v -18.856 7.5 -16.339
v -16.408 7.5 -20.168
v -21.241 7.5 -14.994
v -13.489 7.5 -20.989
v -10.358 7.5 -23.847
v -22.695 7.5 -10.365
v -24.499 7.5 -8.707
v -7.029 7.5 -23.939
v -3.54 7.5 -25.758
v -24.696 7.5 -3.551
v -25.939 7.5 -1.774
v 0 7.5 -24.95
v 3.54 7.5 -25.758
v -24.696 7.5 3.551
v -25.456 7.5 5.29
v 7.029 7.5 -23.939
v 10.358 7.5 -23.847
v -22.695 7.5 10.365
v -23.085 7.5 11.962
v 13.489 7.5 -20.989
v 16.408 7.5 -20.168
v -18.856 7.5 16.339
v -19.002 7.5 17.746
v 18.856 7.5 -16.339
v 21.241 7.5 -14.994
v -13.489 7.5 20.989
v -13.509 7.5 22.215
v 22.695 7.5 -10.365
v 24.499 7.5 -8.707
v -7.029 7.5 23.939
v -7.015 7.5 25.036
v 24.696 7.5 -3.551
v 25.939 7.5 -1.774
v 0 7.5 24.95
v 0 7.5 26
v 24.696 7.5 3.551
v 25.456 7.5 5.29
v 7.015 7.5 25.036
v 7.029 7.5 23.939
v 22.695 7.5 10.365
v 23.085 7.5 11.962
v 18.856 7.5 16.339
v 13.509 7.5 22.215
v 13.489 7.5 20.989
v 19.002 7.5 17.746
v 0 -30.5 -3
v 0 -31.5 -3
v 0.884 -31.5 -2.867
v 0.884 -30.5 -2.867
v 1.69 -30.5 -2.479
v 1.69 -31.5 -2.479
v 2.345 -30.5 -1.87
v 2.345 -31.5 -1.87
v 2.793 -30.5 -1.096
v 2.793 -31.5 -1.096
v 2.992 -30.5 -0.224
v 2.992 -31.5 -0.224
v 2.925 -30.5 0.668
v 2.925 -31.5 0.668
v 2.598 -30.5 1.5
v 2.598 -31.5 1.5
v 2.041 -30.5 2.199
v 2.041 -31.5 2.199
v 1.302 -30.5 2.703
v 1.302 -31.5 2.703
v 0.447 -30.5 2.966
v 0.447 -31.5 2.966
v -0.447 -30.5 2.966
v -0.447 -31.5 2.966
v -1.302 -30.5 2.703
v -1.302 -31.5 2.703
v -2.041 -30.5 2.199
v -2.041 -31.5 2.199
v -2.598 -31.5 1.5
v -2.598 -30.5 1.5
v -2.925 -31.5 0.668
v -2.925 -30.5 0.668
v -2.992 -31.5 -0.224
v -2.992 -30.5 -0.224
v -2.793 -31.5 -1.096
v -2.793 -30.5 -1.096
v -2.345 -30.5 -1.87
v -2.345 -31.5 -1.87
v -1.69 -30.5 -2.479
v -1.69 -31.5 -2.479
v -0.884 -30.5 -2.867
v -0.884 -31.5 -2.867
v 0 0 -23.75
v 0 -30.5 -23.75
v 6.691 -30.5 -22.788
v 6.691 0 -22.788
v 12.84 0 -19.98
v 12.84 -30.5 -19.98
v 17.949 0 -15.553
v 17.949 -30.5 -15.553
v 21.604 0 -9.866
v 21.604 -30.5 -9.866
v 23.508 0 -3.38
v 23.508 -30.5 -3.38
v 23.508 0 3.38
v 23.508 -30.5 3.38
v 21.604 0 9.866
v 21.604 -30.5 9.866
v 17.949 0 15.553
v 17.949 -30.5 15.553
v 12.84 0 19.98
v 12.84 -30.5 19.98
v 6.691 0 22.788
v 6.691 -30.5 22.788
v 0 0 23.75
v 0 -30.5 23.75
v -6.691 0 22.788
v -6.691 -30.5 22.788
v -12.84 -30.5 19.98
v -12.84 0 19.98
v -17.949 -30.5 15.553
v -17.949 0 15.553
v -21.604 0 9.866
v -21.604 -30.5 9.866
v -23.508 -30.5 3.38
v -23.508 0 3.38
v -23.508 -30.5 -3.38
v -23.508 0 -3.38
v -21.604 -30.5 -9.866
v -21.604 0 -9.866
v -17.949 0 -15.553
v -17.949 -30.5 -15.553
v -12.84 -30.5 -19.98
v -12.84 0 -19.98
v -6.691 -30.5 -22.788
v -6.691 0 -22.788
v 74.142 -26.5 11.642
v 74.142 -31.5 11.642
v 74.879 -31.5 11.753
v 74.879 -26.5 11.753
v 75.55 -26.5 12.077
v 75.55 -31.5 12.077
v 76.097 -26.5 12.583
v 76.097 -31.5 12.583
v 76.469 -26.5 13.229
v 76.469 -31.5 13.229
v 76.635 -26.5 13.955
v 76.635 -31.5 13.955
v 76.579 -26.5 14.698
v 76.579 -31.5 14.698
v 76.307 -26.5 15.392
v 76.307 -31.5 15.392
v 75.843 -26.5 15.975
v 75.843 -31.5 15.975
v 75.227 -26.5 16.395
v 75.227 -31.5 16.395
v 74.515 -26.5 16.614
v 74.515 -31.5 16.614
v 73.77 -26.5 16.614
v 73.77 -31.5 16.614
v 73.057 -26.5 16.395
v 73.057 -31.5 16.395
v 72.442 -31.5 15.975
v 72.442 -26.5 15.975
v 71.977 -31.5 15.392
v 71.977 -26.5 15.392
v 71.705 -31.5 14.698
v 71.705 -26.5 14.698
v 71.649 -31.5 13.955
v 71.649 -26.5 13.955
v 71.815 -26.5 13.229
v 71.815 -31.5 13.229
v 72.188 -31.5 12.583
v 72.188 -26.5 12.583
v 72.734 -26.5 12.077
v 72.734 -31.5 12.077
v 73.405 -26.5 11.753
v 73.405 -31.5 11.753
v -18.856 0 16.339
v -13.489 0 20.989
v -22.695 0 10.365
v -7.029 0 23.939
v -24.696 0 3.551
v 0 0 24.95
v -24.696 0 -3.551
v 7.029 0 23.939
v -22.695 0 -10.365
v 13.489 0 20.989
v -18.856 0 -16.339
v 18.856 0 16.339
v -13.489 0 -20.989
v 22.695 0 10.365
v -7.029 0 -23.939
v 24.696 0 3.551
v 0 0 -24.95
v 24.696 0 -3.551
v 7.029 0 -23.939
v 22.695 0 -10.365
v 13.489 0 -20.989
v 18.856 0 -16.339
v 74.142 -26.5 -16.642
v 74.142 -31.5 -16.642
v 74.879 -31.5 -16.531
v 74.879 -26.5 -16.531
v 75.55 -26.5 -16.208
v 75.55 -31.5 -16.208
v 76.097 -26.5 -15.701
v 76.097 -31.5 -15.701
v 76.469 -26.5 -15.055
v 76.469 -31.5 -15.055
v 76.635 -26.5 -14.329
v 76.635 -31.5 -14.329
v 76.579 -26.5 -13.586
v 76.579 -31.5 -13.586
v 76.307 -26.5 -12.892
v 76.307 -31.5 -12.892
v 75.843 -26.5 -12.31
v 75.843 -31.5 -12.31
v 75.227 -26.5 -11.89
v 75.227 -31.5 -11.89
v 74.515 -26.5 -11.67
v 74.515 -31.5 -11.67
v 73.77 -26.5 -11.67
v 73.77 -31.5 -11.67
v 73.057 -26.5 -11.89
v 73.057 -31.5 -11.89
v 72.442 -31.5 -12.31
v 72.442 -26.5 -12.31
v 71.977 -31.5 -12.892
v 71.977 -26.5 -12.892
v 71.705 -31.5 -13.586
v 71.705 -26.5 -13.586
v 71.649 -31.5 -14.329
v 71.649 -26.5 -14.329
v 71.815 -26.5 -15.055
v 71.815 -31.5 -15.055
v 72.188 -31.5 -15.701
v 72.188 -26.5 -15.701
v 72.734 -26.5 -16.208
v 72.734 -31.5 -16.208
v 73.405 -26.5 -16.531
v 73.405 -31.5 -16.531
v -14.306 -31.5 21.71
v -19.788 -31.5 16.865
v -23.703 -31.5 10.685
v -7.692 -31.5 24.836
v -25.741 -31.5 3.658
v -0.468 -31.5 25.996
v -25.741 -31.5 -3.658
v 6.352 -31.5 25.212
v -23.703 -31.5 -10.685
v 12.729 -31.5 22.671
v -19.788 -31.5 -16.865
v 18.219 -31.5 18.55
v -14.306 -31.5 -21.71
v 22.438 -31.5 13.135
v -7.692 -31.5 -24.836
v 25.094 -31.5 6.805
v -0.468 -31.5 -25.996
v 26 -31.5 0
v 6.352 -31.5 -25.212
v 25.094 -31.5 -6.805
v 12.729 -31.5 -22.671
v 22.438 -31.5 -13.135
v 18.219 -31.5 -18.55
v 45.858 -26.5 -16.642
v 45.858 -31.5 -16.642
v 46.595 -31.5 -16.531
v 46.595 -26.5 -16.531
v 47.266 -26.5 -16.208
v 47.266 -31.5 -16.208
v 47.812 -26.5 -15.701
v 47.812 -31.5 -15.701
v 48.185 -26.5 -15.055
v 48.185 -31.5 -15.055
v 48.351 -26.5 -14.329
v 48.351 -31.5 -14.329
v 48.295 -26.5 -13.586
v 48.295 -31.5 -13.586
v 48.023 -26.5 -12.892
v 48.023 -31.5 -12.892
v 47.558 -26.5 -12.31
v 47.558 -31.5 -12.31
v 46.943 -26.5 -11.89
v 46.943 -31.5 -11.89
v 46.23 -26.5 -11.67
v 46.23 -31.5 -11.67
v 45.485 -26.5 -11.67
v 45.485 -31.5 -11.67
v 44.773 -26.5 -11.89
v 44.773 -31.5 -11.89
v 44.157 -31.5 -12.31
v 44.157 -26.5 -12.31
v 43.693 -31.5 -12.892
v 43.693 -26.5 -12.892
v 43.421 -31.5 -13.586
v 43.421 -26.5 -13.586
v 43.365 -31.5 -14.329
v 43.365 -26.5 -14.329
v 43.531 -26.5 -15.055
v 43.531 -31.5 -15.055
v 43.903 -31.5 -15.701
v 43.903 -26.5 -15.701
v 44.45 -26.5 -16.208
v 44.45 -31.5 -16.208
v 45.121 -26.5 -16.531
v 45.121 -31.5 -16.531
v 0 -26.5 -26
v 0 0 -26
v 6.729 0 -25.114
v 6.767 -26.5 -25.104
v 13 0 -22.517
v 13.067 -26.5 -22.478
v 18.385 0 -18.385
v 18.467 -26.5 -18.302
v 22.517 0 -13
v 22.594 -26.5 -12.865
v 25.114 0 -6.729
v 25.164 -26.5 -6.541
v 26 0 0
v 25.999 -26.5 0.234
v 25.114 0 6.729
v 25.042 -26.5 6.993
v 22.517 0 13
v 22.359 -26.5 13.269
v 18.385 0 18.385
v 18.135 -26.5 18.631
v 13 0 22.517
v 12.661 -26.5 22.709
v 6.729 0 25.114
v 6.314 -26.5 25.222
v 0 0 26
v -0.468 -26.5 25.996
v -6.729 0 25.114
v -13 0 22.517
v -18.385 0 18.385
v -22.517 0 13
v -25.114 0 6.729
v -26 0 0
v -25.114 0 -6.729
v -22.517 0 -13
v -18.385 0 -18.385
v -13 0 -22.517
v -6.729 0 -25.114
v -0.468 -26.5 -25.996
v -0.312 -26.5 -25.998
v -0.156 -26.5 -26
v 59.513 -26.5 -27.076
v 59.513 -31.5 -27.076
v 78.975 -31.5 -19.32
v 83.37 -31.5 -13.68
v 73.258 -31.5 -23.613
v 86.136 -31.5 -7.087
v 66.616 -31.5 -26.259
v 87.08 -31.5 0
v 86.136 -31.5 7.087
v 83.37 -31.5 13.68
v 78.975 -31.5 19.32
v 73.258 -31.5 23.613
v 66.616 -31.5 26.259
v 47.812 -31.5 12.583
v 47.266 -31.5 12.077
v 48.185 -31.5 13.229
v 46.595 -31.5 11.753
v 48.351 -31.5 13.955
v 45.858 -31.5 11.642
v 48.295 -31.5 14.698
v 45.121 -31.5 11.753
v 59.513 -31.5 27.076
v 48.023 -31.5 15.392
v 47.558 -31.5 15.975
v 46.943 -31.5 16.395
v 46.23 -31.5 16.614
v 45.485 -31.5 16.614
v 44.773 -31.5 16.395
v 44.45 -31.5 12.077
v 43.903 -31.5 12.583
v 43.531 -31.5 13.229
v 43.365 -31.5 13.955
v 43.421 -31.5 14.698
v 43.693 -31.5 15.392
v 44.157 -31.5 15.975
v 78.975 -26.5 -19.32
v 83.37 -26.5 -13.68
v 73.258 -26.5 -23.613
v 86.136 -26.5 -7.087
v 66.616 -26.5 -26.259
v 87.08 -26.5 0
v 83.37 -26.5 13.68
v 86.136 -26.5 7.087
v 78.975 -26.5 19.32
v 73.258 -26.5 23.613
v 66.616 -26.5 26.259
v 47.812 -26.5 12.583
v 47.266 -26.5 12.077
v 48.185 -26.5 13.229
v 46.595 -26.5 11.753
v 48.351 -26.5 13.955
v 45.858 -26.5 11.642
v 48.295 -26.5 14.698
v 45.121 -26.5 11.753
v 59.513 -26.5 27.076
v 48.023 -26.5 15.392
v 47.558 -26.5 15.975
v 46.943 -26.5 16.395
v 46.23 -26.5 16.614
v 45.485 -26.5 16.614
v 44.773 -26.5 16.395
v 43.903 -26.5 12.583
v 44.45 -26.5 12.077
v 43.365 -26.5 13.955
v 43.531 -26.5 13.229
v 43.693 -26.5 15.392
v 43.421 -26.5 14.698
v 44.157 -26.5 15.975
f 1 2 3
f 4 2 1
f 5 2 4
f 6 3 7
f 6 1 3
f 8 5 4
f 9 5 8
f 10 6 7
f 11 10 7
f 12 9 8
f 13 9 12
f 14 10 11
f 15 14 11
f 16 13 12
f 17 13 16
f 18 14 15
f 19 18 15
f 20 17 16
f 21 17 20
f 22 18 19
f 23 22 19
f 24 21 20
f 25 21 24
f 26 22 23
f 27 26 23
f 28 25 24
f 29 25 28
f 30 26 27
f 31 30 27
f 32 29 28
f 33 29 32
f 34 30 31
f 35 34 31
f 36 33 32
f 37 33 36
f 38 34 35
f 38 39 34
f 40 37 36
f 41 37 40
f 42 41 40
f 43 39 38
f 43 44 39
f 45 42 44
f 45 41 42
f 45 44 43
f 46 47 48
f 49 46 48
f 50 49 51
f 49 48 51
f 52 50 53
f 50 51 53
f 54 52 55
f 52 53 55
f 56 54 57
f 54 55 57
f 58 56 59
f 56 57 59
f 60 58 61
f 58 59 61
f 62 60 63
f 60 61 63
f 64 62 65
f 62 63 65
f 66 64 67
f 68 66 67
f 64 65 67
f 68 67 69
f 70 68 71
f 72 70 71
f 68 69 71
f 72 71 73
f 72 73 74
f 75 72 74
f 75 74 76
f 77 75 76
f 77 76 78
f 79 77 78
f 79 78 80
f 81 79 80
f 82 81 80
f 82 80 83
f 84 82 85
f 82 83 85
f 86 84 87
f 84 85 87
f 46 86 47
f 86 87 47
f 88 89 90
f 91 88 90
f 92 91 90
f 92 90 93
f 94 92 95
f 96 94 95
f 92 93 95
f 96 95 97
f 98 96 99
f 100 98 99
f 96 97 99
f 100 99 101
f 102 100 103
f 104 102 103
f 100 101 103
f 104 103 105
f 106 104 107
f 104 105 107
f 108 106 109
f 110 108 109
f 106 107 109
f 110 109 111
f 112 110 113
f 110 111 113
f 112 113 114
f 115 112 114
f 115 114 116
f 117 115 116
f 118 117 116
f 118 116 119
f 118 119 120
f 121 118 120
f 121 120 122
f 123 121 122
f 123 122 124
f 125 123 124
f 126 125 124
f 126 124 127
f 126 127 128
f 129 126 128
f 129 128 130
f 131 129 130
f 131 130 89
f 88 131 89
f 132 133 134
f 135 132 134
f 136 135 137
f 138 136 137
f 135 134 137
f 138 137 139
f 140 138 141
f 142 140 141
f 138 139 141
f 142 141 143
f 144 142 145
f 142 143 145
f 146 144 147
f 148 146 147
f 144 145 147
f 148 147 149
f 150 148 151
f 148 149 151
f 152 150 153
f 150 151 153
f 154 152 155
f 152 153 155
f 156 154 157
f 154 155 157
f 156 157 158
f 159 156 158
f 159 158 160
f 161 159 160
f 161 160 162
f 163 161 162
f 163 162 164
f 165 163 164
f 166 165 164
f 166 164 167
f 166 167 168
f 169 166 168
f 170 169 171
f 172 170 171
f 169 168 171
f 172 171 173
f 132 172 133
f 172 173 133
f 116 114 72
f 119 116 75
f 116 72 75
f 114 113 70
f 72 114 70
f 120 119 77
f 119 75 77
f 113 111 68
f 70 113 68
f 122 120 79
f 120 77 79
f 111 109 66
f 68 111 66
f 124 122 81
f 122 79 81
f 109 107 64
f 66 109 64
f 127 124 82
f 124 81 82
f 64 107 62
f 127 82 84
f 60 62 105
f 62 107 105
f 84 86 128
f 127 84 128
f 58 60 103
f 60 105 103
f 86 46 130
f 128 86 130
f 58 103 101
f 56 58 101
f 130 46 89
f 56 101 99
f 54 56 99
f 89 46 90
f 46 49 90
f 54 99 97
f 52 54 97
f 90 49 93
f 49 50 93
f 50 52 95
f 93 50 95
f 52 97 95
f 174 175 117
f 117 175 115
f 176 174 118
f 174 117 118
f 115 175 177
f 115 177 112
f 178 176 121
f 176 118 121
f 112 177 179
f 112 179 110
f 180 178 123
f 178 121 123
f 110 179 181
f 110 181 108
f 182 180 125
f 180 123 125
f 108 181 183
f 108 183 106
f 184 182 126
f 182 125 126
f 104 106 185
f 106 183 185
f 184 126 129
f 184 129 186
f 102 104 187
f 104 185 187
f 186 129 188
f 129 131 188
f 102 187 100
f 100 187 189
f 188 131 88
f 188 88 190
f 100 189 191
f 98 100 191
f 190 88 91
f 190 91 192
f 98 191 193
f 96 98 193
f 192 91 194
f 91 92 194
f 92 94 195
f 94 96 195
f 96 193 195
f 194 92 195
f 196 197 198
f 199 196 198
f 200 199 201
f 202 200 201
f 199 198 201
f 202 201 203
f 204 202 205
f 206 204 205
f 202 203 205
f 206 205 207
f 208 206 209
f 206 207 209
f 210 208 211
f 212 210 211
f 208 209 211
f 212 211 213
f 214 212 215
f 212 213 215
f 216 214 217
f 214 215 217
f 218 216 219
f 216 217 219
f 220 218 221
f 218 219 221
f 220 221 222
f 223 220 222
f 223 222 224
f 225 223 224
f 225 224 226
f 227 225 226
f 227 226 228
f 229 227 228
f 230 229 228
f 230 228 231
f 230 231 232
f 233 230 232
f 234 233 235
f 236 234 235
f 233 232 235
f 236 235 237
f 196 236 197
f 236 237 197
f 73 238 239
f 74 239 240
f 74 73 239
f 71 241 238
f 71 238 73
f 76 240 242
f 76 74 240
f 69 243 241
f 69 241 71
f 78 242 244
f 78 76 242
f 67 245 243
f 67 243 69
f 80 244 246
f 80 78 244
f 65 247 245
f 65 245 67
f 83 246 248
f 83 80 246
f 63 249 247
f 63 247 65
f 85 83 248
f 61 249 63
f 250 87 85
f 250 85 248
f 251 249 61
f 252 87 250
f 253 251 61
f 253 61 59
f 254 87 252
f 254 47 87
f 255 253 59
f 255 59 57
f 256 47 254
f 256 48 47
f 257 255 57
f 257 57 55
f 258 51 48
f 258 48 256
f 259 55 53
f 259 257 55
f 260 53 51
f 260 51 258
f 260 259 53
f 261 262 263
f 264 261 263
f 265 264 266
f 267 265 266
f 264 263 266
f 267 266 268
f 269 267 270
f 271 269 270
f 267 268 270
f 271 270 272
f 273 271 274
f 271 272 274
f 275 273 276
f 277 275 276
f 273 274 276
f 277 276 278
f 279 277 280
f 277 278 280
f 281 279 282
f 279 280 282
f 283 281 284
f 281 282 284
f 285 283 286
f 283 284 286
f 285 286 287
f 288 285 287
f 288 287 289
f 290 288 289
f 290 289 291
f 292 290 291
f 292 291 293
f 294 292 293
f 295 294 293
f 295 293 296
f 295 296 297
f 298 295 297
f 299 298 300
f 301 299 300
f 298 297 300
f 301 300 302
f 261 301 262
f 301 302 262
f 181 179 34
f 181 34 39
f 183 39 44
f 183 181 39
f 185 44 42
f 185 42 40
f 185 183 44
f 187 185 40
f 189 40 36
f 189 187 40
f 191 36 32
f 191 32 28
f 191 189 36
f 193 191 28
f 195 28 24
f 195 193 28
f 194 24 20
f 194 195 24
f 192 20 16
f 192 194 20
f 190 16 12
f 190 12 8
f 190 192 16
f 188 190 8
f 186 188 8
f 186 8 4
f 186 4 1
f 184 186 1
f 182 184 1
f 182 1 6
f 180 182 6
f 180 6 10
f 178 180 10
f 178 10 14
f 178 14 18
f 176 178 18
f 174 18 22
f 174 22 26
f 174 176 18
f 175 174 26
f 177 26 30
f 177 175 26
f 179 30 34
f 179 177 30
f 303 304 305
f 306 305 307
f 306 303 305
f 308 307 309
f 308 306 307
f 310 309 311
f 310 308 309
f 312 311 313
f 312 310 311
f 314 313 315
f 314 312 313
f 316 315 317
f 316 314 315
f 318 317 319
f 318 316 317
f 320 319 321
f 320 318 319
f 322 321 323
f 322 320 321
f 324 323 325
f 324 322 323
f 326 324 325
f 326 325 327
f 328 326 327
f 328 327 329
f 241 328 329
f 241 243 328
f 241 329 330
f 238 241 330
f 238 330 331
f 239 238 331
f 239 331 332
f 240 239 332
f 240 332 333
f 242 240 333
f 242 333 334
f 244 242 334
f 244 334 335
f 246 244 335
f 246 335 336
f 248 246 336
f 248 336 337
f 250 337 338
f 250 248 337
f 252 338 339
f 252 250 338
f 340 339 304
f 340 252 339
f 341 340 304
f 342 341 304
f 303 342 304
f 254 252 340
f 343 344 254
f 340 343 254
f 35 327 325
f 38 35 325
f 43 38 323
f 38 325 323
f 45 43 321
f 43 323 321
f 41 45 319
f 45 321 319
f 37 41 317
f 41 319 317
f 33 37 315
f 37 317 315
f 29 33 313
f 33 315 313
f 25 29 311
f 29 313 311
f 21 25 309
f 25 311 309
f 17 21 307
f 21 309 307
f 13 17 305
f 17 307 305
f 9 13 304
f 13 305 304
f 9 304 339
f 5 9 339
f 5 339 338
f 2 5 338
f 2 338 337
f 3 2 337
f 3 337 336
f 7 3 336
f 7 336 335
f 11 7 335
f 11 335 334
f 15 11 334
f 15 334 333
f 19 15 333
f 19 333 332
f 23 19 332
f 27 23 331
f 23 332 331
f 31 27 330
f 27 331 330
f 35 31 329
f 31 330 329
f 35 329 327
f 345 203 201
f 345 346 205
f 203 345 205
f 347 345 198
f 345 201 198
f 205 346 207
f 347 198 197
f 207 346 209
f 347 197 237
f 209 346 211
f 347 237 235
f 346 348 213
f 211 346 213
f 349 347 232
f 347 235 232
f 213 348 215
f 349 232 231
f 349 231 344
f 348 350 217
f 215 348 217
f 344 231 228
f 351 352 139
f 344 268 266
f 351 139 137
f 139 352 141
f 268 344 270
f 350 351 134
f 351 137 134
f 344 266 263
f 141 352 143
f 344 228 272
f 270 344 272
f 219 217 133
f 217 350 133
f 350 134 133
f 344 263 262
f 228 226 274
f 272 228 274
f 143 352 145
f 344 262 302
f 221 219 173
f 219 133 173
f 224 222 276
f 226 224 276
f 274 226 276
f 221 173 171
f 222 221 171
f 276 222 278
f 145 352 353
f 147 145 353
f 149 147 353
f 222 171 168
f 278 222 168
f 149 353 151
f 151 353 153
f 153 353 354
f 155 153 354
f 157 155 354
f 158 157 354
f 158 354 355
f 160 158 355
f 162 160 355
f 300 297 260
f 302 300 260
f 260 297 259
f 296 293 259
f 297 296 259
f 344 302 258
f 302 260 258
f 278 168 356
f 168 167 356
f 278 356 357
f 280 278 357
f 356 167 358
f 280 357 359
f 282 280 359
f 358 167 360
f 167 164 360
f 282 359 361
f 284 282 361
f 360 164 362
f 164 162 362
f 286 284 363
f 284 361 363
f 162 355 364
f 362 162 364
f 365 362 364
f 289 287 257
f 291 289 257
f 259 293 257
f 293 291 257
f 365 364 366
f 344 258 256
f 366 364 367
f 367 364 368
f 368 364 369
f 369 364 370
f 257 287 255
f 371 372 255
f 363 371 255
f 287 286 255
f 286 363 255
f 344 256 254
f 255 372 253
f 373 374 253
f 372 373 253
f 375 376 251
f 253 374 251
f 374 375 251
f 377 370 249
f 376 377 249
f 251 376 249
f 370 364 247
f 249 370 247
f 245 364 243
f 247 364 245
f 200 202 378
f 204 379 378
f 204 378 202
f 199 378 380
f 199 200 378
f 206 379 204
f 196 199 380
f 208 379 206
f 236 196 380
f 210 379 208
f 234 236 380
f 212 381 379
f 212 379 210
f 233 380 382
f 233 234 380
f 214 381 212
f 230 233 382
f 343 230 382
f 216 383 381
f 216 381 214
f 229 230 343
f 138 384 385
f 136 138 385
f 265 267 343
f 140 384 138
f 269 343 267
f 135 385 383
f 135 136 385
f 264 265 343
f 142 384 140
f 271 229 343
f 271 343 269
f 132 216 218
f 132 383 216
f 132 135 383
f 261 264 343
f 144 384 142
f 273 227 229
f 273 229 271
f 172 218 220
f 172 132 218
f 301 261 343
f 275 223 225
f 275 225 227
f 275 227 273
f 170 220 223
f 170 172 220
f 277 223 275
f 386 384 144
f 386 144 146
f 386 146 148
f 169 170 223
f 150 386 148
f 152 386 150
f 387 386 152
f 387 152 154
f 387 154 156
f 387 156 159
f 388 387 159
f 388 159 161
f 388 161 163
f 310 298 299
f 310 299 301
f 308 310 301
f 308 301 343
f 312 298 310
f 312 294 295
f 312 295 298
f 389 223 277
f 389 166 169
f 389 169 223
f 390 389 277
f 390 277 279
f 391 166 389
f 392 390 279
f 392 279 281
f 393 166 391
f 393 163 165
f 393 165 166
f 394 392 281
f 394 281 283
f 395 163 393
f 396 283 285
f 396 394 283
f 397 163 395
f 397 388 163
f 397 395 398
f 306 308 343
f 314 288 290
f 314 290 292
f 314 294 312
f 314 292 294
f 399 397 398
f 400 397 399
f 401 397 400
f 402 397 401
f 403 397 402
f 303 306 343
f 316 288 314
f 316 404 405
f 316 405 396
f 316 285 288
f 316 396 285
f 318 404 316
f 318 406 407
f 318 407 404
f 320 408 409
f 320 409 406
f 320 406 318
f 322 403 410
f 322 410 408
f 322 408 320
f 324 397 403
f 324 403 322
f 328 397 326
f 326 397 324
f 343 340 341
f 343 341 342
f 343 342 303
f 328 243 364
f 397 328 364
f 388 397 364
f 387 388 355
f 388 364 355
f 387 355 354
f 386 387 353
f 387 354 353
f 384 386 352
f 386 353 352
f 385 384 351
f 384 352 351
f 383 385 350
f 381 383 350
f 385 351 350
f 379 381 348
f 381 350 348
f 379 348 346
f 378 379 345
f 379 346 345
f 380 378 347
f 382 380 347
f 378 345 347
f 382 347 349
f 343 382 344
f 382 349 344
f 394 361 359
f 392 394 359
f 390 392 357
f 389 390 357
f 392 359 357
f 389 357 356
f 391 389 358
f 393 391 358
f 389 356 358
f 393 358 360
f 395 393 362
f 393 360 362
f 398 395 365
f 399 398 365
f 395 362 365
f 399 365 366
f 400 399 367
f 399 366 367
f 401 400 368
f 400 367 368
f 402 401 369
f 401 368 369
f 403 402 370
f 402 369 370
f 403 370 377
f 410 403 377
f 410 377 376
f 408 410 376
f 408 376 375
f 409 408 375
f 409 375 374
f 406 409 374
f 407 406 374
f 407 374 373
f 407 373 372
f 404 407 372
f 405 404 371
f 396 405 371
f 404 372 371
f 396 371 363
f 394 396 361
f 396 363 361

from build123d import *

# Parameters (mm, degrees)
SKETCH1_R           = 26
SKETCH1_R_2         = 24.95
BOSS_EXTRUDE1_DEPTH = 7.5
BOSS_EXTRUDE2_START = 31.5
SKETCH2_R           = 26
SKETCH2_R_2         = 23.75
BOSS_EXTRUDE2_DEPTH = 31.5
SKETCH3_R           = 23.75
BOSS_EXTRUDE3_DEPTH = 1
SKETCH4_R           = 3
CUT_EXTRUDE1_DEPTH  = 1
BOSS_EXTRUDE4_DEPTH = 5
SKETCH6_R           = 2.5
CUT_EXTRUDE2_DEPTH  = 5


with BuildPart() as part:
    # Sketch1 → Boss-Extrude1 (new body)
    with BuildSketch(Plane(origin=(0, 0, 0), x_dir=(1, 0, 0), z_dir=(0, 1, 0))):
        with Locations(Location((0, 0, 0), (0, 0, 270))):
            Circle(SKETCH1_R)
        with Locations(Location((0, 0, 0), (0, 0, 270))):
            Circle(SKETCH1_R_2, mode=Mode.SUBTRACT)
    extrude(amount=BOSS_EXTRUDE1_DEPTH)

    # Sketch2 → Boss-Extrude2 (add)
    with BuildSketch(Plane.XZ.offset(BOSS_EXTRUDE2_START)):
        with Locations(Location((0, 0, 0), (0, 0, 270))):
            Circle(SKETCH2_R)
        with Locations(Location((0, 0, 0), (0, 0, 270))):
            Circle(SKETCH2_R_2, mode=Mode.SUBTRACT)
    extrude(amount=-BOSS_EXTRUDE2_DEPTH)

    # Sketch3 → Boss-Extrude3 (add)
    with BuildSketch(Plane.XZ.offset(31.5)):
        with Locations(Location((0, 0, 0), (0, 0, 270))):
            Circle(SKETCH3_R)
    extrude(amount=-BOSS_EXTRUDE3_DEPTH)

    # Sketch4 → Cut-Extrude1 (cut)
    with BuildSketch(Plane.XZ.offset(31.5)):
        with Locations(Location((0, 0, 0), (0, 0, 270))):
            Circle(SKETCH4_R)
    extrude(amount=-CUT_EXTRUDE1_DEPTH, mode=Mode.SUBTRACT)

    # Sketch5 → Boss-Extrude4 (add)
    with BuildSketch(Plane.XZ.offset(31.5)):
        with BuildLine():
            Line((-0.468, 25.995787659), (59.51256, 27.075612685))
            ThreePointArc((59.51256, 27.075612685), (87.08, 0), (59.51256, -27.075612685))
            Line((59.51256, -27.075612685), (-0.468, -25.995787659))
            ThreePointArc((-0.468, -25.995787659), (26, 0), (-0.468, 25.995787659))
        make_face()
    extrude(amount=-BOSS_EXTRUDE4_DEPTH)

    # Sketch6 → Cut-Extrude2 (cut)
    with BuildSketch(Plane.XZ.offset(31.5)):
        with Locations(Location((74.142135624, 14.142135624, 0), (0, 0, 270))):
            Circle(SKETCH6_R)
        with Locations(Location((74.142135624, -14.142135624, 0), (0, 0, 270))):
            Circle(SKETCH6_R)
        with Locations(Location((45.857864376, -14.142135624, 0), (0, 0, 270))):
            Circle(SKETCH6_R)
        with Locations(Location((45.857864376, 14.142135624, 0), (0, 0, 270))):
            Circle(SKETCH6_R)
    extrude(amount=-CUT_EXTRUDE2_DEPTH, mode=Mode.SUBTRACT)


solid = part.part
